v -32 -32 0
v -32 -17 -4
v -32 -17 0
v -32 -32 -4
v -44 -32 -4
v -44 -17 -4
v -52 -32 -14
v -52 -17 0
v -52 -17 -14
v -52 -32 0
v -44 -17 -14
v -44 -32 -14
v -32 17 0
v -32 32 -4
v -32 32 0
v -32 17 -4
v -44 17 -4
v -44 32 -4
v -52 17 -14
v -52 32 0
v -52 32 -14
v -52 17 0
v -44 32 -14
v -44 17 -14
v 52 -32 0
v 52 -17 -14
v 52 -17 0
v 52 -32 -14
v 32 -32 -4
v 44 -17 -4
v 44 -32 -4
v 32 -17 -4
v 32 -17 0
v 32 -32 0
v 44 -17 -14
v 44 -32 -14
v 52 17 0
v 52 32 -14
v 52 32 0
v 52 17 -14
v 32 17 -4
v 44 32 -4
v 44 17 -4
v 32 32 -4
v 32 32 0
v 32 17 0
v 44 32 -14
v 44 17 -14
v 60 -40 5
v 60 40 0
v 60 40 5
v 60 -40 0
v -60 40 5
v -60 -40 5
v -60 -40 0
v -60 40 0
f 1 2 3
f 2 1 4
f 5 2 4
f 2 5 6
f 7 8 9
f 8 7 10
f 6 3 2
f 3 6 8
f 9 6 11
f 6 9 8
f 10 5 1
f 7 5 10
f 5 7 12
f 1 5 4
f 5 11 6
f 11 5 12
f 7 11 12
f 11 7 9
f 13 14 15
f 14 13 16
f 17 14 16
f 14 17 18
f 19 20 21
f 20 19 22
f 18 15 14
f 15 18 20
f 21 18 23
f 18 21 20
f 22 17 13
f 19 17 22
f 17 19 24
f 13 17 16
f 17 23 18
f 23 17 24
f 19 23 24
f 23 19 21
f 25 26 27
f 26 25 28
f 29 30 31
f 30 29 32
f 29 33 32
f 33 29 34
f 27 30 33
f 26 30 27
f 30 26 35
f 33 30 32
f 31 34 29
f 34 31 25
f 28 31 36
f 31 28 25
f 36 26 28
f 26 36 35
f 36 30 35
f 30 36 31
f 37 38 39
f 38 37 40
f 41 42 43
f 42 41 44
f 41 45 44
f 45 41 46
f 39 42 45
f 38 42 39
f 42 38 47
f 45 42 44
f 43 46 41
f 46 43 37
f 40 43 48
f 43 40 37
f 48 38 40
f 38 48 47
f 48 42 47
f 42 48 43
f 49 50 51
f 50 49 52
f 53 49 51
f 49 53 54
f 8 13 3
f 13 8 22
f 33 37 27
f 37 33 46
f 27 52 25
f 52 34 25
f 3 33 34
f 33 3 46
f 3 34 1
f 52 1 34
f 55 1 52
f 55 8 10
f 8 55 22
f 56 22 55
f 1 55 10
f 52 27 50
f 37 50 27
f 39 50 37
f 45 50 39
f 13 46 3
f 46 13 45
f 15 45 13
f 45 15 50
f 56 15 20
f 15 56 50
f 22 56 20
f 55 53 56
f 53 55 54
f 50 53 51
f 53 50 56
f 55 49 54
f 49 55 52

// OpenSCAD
// Parameters
slab_width = 120;       // Overall width of the main rectangular slab
slab_depth = 80;        // Overall depth of the main rectangular slab
slab_thickness = 5;     // Thickness of the main rectangular slab

pad_width = 20;         // Width of the shallow underside pad (Tier 1)
pad_depth = 15;         // Depth of the shallow underside pad (Tier 1)
pad_thickness = 4;      // Thickness (downward extrusion) of the shallow pad

leg_width = 8;          // Width of the deeper continuation (Tier 2)
leg_thickness = 10;     // Additional thickness (downward extrusion) of the deeper continuation

pad_offset_x = 8;       // Distance from the left/right edge of the slab to the pad
pad_offset_y = 8;       // Distance from the front/back edge of the slab to the pad

eps = 0.01;             // Small overlap value to ensure valid manifold geometry
$fn = 100;              // Resolution for any future curved additions

// Reusable module for the two-tier underside protrusion
module underside_feature(is_left) {
    union() {
        // Tier 1: Shallow underside pad
        // Positioned below the slab, slightly overlapping upwards for manifoldness
        translate([0, 0, -pad_thickness/2 + eps/2])
            cube([pad_width, pad_depth, pad_thickness + eps], center=true);

        // Tier 2: Deeper continuation (leg)
        // Aligned to share the front and back edges (same depth) and either the left or right edge
        leg_x_offset = is_left ? -(pad_width - leg_width)/2 : (pad_width - leg_width)/2;
        
        // Positioned below the pad, slightly overlapping upwards
        translate([leg_x_offset, 0, -pad_thickness - leg_thickness/2 + eps/2])
            cube([leg_width, pad_depth, leg_thickness + eps], center=true);
    }
}

// Main model construction
union() {
    // Main rectangular slab
    // Base is at z=0, grows upwards to z=slab_thickness
    translate([0, 0, slab_thickness/2])
        cube([slab_width, slab_depth, slab_thickness], center=true);

    // Generate the four underside features
    for (x_sign = [-1, 1]) {
        for (y_sign = [-1, 1]) {
            // Calculate absolute positions relative to the center
            x_pos = x_sign * (slab_width/2 - pad_offset_x - pad_width/2);
            y_pos = y_sign * (slab_depth/2 - pad_offset_y - pad_depth/2);
            
            // Determine if the pad is on the left side to align the leg correctly
            is_left = (x_sign == -1);

            // Place the dual-tier pad at the correct corner
            translate([x_pos, y_pos, 0])
                underside_feature(is_left);
        }
    }
}
